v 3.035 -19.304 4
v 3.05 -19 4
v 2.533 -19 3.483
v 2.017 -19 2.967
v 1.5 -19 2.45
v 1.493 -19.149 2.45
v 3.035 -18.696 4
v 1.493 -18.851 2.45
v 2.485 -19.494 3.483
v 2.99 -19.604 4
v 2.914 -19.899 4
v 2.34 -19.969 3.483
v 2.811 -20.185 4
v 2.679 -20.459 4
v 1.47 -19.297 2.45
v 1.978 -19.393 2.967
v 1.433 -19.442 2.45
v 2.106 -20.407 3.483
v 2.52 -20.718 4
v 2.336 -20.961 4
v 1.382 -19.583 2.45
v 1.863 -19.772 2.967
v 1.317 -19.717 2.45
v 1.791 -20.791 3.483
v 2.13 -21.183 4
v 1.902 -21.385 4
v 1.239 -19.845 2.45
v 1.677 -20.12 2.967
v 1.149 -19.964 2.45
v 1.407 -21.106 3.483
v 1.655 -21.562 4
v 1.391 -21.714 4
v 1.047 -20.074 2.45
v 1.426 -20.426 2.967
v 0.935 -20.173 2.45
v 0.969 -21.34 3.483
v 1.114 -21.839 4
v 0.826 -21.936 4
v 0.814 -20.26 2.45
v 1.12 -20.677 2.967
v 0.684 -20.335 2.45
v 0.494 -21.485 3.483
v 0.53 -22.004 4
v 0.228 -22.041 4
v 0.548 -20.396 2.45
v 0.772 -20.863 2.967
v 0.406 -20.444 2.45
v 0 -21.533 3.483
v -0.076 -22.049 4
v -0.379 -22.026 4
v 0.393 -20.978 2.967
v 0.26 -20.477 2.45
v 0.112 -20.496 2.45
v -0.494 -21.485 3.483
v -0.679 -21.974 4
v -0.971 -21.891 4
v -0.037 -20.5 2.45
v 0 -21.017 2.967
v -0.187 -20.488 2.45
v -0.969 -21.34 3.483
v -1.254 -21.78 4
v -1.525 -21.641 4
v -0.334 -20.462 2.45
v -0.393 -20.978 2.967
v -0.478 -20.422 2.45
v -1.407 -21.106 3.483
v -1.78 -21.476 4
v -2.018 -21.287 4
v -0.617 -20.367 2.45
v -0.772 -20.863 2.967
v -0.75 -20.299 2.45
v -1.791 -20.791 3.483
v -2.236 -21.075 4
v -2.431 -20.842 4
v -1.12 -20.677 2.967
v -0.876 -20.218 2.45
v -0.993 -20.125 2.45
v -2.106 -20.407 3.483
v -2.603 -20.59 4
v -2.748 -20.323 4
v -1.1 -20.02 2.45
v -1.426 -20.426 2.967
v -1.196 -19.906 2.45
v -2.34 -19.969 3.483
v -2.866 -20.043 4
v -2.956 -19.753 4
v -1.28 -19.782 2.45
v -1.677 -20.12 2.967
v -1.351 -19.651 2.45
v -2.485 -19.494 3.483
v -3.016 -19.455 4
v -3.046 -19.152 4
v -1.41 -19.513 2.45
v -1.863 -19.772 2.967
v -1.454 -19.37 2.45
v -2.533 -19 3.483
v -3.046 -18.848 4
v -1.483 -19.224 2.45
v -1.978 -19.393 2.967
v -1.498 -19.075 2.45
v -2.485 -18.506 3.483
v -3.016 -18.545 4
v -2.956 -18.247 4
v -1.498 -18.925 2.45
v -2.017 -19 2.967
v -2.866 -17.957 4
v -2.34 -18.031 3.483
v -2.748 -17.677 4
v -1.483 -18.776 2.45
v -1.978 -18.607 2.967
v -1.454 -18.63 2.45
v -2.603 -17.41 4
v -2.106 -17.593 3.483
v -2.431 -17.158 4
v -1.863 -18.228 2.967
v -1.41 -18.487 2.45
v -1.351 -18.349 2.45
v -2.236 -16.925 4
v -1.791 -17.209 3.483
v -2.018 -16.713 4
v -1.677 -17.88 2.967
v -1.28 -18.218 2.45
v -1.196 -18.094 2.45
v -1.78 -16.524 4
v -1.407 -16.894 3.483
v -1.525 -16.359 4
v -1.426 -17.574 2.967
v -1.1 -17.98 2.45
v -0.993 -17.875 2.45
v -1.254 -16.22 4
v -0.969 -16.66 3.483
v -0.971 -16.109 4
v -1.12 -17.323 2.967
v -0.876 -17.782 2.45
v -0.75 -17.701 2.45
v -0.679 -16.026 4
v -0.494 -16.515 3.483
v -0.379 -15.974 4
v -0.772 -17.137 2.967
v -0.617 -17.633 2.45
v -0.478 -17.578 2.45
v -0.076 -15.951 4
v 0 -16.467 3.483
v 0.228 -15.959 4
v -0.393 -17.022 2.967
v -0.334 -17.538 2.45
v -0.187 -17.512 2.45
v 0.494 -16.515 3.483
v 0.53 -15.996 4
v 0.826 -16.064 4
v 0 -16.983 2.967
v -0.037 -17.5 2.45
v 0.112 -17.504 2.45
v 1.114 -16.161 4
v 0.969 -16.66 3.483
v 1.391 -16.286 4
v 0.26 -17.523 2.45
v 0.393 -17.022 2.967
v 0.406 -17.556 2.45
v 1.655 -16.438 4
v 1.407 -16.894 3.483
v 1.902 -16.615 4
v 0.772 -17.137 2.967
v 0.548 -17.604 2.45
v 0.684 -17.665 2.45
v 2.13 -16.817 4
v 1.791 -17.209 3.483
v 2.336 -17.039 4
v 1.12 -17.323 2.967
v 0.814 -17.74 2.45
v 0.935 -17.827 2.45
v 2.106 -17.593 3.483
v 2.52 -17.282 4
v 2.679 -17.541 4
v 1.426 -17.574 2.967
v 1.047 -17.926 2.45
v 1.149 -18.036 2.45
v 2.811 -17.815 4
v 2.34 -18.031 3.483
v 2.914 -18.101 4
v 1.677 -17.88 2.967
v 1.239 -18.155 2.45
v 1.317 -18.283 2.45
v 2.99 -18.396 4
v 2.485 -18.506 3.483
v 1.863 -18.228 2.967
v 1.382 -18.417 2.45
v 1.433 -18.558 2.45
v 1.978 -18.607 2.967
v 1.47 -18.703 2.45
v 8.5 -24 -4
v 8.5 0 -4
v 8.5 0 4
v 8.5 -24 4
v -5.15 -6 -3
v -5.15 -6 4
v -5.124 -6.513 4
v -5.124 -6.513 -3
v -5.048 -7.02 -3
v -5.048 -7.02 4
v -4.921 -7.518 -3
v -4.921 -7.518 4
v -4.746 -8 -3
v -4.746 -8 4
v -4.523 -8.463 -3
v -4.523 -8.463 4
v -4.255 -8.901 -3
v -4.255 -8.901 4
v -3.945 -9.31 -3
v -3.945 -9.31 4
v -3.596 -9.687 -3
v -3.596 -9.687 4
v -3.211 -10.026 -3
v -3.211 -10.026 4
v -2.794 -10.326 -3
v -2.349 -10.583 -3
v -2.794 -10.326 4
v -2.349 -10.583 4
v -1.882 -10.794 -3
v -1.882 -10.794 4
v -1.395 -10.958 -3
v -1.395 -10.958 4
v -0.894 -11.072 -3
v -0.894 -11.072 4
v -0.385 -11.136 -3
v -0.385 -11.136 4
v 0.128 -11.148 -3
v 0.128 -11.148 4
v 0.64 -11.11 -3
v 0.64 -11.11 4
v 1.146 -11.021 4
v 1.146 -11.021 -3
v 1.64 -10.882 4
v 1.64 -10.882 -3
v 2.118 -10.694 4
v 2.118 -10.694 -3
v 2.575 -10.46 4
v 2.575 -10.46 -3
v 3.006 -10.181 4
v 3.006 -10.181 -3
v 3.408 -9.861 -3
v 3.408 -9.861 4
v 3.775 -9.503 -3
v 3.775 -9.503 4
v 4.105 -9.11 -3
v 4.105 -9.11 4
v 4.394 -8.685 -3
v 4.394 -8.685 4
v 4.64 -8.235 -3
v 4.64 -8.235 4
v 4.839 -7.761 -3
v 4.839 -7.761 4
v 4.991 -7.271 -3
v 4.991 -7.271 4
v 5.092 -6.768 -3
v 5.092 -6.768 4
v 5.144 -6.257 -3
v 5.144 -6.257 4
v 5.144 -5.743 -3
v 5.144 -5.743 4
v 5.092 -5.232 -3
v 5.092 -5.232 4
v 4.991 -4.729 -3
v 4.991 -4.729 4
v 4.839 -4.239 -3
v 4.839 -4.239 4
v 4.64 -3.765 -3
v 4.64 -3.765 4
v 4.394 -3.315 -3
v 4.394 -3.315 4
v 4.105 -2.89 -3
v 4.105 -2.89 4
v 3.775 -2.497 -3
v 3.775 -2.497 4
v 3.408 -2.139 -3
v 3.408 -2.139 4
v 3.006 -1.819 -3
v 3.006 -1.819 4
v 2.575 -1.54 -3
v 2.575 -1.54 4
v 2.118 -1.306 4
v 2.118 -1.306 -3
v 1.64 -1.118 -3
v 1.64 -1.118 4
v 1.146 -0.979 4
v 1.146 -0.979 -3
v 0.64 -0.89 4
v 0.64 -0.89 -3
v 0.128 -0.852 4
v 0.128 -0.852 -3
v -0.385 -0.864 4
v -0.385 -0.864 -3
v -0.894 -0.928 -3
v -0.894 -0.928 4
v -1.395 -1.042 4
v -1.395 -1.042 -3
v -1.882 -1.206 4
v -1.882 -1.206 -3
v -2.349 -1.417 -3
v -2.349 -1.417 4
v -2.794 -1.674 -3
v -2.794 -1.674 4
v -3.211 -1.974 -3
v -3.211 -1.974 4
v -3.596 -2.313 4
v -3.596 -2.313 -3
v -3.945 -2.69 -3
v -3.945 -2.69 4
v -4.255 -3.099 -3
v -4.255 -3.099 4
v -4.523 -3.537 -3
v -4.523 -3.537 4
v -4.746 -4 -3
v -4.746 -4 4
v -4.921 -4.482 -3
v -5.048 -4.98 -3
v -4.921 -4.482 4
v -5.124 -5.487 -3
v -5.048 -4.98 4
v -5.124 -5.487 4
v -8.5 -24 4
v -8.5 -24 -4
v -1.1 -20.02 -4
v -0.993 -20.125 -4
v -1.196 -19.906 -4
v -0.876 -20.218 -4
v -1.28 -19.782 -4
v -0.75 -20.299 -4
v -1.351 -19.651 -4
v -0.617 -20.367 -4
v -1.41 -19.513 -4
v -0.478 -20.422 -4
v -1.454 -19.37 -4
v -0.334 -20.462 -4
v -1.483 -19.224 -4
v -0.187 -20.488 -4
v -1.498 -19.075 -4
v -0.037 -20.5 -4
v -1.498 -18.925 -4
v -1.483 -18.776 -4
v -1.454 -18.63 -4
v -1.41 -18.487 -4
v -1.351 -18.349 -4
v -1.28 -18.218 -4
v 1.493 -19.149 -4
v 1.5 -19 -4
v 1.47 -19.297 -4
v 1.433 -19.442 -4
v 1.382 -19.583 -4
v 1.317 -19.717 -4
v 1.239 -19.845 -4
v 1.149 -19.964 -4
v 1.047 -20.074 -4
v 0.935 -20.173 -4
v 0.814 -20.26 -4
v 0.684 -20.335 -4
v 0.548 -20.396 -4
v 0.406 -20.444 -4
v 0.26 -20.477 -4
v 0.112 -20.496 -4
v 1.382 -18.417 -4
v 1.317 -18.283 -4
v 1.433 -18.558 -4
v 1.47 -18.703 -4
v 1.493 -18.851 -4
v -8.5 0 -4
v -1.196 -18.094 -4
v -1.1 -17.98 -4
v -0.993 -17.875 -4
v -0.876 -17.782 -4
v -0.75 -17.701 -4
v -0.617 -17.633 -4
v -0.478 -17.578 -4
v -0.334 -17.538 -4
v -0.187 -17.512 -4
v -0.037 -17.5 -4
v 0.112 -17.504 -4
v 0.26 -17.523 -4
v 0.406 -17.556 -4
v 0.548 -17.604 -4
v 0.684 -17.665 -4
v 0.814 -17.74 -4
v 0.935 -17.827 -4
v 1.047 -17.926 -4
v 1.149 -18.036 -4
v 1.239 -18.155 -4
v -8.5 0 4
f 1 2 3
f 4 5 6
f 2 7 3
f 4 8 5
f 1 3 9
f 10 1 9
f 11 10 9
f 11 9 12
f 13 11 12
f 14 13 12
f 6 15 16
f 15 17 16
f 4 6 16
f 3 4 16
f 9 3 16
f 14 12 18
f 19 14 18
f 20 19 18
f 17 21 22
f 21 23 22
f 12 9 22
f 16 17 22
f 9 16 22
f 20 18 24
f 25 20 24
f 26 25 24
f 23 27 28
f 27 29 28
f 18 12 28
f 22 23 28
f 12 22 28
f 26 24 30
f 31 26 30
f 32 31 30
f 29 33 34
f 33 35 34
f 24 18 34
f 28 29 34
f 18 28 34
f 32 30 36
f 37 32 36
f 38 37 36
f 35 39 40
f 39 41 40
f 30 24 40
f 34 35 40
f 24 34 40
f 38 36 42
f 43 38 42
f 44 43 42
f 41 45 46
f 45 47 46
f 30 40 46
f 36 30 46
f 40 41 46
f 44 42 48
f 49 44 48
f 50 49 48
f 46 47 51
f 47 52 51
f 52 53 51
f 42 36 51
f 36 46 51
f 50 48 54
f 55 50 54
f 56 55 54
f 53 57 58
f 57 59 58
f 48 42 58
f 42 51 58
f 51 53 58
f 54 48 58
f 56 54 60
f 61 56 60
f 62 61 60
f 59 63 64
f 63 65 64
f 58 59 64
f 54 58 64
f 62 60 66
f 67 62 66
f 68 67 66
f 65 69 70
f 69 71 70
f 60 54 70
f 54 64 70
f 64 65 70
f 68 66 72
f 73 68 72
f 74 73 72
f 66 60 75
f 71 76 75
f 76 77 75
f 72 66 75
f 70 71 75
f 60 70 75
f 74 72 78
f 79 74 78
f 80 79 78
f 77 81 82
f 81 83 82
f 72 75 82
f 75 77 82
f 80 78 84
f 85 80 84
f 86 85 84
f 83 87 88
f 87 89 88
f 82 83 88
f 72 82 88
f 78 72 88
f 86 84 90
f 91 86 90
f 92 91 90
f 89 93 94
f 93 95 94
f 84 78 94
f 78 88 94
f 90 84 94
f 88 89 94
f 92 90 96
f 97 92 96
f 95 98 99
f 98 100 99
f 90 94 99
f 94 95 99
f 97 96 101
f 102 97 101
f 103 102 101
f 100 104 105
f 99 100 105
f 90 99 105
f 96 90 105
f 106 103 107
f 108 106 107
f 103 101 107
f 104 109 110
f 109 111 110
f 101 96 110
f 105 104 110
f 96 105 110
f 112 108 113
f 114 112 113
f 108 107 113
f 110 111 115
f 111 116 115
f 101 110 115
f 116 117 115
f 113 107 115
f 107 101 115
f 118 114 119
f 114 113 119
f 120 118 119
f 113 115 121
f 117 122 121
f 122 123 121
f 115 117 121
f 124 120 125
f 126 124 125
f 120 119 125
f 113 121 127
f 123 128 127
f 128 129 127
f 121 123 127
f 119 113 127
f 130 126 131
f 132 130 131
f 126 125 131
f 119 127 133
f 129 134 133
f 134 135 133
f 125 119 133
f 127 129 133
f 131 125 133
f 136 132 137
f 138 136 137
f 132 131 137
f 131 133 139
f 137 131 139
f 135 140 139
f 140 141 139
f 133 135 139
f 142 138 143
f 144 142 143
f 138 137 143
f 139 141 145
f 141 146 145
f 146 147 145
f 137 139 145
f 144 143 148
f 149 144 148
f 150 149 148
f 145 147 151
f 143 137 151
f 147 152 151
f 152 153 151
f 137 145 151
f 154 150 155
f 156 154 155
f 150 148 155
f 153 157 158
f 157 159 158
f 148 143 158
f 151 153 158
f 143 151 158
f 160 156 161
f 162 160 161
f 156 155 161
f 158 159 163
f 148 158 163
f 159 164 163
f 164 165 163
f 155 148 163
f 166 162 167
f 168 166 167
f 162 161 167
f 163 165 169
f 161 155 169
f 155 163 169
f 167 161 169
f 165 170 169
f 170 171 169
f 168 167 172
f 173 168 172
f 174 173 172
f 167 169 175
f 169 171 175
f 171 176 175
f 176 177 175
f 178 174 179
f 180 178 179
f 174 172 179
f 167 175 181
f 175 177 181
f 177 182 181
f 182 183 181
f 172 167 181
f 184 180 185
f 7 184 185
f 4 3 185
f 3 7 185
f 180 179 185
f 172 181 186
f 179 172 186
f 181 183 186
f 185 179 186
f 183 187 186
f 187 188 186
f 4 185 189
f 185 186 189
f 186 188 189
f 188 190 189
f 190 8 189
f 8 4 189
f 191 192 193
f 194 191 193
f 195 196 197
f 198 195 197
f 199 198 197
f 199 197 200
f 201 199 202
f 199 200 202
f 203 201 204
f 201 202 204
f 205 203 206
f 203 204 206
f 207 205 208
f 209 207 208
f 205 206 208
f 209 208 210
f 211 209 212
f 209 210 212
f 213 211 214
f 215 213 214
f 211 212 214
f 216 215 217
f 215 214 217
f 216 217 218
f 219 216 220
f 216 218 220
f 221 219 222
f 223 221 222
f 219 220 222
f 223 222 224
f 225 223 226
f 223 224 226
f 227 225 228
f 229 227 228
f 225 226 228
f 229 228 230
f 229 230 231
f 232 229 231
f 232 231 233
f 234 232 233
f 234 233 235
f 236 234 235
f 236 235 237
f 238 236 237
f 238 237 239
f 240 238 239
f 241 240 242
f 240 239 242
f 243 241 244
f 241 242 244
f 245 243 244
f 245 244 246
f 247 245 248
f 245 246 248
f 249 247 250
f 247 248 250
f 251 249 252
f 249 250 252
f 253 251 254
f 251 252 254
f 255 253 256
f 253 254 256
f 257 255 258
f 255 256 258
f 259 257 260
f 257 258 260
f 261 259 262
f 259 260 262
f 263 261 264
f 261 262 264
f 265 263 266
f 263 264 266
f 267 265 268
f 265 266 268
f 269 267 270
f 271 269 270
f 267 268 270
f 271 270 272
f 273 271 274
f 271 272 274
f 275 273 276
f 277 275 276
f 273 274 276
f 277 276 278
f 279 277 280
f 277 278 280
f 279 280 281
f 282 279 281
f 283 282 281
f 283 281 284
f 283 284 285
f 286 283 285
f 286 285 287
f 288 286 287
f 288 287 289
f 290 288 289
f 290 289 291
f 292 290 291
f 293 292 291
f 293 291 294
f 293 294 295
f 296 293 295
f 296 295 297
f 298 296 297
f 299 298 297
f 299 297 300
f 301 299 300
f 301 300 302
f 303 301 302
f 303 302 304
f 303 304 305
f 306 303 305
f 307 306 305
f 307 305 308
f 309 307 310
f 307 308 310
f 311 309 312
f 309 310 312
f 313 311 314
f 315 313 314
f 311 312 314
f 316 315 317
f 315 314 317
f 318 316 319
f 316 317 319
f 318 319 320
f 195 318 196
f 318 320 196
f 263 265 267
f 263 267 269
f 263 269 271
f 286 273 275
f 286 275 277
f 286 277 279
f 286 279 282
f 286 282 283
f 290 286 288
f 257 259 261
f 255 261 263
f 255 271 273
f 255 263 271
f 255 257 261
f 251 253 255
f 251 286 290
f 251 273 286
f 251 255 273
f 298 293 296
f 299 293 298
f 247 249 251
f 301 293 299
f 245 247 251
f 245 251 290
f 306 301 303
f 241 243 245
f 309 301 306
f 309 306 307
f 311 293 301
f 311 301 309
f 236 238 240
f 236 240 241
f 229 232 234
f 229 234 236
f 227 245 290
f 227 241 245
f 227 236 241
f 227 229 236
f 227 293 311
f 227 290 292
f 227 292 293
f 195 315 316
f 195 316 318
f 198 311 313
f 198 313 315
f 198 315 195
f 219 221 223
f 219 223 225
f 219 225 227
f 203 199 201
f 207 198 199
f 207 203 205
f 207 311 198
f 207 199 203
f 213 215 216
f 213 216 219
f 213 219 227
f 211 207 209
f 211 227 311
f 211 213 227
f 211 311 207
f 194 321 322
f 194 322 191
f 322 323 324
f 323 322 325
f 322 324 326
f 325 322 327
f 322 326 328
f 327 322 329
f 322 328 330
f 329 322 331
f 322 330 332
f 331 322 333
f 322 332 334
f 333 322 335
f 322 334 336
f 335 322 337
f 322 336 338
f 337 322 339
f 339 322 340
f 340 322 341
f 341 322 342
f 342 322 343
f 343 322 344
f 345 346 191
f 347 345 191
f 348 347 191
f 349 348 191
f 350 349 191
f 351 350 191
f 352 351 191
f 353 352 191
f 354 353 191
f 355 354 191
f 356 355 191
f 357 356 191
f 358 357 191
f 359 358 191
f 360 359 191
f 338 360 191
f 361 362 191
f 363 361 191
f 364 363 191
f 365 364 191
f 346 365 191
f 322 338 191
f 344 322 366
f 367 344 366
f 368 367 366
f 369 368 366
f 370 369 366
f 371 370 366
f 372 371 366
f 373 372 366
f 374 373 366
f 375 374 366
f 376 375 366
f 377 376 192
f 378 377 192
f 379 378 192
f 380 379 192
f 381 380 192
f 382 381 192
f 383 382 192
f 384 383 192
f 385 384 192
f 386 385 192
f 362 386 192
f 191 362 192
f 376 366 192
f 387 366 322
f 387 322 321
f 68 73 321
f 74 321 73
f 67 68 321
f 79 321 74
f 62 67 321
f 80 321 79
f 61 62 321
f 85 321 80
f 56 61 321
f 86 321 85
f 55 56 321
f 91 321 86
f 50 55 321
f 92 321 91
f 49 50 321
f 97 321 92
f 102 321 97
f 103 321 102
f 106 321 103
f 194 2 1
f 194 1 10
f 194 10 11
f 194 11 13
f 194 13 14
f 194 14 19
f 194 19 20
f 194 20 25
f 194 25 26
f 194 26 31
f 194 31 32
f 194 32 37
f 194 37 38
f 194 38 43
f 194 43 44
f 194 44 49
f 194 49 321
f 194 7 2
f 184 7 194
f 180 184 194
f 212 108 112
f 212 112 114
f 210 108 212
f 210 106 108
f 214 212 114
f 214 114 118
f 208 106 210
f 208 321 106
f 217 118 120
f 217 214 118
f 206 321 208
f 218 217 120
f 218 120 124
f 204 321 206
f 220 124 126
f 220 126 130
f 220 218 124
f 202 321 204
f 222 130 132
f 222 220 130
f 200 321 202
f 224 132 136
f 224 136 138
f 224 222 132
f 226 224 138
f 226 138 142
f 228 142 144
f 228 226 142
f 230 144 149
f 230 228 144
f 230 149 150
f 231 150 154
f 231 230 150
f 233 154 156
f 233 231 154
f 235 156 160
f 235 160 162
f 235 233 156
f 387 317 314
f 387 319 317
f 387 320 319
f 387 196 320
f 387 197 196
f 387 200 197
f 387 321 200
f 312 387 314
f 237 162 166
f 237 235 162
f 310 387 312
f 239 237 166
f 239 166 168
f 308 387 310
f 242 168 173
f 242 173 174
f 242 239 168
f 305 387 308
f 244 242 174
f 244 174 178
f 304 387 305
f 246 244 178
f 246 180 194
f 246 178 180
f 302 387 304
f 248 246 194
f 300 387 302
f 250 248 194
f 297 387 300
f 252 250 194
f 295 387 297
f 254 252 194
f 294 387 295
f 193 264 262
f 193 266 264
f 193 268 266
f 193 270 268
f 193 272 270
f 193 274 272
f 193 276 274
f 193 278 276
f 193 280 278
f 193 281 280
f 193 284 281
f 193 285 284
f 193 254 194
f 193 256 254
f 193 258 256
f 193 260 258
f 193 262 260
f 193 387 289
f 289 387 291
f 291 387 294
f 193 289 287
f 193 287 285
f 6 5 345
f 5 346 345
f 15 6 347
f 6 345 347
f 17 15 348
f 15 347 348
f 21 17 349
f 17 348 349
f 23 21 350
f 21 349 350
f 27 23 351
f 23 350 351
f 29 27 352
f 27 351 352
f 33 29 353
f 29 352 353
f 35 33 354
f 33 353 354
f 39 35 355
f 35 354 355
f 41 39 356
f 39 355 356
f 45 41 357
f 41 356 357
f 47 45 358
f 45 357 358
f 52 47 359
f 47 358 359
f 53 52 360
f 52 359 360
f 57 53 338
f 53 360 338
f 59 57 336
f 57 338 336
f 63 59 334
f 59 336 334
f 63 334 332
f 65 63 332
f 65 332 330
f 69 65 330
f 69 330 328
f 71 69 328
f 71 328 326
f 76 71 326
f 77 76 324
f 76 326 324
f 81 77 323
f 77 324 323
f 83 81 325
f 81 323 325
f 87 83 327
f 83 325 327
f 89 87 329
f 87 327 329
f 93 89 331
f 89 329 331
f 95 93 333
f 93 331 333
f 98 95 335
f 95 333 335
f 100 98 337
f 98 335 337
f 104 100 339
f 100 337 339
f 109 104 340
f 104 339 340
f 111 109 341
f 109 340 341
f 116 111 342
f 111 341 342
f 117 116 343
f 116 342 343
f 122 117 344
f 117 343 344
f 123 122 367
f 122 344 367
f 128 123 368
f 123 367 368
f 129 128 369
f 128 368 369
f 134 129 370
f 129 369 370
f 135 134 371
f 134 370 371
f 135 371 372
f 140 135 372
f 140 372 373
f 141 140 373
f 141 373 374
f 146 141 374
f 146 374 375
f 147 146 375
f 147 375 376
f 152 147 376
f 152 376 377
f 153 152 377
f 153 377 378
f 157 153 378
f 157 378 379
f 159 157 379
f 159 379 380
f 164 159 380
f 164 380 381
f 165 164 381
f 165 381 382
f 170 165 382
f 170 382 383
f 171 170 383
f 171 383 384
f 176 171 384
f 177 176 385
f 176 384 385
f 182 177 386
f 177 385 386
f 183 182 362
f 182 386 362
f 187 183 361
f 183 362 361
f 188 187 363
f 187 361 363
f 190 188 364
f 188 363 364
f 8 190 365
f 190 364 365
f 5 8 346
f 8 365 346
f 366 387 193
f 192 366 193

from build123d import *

# Parameters (mm, degrees)
SKETCH003_W         = 17
SKETCH003_H         = 8
PAD001_DEPTH        = 24
SKETCH005_R         = 5.15
POCKET_DEPTH        = 7
HOLE002_D           = 3
HOLE002_DEPTH       = 25
HOLE002_CSINK_D     = 6.1
HOLE002_CSINK_ANGLE = 90


with BuildPart() as part:
    # Sketch003 → Pad001 (new body)
    with BuildSketch(Plane.XZ):
        Rectangle(SKETCH003_W, SKETCH003_H)
    extrude(amount=PAD001_DEPTH)

    # Sketch005 → Pocket (cut)
    with BuildSketch(Plane(origin=(0, 0, 4), x_dir=(-1, 0, 0), z_dir=(0, 0, 1))):
        with Locations((0, 6)):
            Circle(SKETCH005_R)
    extrude(amount=-POCKET_DEPTH, mode=Mode.SUBTRACT)

    # Hole002
    with Locations(Plane(origin=(0, 0, 4), x_dir=(-1, 0, 0), z_dir=(0, 0, 1))):
        with Locations((0, 19)):
            CounterSinkHole(HOLE002_D / 2, HOLE002_CSINK_D / 2, depth=HOLE002_DEPTH, counter_sink_angle=HOLE002_CSINK_ANGLE)


solid = part.part
